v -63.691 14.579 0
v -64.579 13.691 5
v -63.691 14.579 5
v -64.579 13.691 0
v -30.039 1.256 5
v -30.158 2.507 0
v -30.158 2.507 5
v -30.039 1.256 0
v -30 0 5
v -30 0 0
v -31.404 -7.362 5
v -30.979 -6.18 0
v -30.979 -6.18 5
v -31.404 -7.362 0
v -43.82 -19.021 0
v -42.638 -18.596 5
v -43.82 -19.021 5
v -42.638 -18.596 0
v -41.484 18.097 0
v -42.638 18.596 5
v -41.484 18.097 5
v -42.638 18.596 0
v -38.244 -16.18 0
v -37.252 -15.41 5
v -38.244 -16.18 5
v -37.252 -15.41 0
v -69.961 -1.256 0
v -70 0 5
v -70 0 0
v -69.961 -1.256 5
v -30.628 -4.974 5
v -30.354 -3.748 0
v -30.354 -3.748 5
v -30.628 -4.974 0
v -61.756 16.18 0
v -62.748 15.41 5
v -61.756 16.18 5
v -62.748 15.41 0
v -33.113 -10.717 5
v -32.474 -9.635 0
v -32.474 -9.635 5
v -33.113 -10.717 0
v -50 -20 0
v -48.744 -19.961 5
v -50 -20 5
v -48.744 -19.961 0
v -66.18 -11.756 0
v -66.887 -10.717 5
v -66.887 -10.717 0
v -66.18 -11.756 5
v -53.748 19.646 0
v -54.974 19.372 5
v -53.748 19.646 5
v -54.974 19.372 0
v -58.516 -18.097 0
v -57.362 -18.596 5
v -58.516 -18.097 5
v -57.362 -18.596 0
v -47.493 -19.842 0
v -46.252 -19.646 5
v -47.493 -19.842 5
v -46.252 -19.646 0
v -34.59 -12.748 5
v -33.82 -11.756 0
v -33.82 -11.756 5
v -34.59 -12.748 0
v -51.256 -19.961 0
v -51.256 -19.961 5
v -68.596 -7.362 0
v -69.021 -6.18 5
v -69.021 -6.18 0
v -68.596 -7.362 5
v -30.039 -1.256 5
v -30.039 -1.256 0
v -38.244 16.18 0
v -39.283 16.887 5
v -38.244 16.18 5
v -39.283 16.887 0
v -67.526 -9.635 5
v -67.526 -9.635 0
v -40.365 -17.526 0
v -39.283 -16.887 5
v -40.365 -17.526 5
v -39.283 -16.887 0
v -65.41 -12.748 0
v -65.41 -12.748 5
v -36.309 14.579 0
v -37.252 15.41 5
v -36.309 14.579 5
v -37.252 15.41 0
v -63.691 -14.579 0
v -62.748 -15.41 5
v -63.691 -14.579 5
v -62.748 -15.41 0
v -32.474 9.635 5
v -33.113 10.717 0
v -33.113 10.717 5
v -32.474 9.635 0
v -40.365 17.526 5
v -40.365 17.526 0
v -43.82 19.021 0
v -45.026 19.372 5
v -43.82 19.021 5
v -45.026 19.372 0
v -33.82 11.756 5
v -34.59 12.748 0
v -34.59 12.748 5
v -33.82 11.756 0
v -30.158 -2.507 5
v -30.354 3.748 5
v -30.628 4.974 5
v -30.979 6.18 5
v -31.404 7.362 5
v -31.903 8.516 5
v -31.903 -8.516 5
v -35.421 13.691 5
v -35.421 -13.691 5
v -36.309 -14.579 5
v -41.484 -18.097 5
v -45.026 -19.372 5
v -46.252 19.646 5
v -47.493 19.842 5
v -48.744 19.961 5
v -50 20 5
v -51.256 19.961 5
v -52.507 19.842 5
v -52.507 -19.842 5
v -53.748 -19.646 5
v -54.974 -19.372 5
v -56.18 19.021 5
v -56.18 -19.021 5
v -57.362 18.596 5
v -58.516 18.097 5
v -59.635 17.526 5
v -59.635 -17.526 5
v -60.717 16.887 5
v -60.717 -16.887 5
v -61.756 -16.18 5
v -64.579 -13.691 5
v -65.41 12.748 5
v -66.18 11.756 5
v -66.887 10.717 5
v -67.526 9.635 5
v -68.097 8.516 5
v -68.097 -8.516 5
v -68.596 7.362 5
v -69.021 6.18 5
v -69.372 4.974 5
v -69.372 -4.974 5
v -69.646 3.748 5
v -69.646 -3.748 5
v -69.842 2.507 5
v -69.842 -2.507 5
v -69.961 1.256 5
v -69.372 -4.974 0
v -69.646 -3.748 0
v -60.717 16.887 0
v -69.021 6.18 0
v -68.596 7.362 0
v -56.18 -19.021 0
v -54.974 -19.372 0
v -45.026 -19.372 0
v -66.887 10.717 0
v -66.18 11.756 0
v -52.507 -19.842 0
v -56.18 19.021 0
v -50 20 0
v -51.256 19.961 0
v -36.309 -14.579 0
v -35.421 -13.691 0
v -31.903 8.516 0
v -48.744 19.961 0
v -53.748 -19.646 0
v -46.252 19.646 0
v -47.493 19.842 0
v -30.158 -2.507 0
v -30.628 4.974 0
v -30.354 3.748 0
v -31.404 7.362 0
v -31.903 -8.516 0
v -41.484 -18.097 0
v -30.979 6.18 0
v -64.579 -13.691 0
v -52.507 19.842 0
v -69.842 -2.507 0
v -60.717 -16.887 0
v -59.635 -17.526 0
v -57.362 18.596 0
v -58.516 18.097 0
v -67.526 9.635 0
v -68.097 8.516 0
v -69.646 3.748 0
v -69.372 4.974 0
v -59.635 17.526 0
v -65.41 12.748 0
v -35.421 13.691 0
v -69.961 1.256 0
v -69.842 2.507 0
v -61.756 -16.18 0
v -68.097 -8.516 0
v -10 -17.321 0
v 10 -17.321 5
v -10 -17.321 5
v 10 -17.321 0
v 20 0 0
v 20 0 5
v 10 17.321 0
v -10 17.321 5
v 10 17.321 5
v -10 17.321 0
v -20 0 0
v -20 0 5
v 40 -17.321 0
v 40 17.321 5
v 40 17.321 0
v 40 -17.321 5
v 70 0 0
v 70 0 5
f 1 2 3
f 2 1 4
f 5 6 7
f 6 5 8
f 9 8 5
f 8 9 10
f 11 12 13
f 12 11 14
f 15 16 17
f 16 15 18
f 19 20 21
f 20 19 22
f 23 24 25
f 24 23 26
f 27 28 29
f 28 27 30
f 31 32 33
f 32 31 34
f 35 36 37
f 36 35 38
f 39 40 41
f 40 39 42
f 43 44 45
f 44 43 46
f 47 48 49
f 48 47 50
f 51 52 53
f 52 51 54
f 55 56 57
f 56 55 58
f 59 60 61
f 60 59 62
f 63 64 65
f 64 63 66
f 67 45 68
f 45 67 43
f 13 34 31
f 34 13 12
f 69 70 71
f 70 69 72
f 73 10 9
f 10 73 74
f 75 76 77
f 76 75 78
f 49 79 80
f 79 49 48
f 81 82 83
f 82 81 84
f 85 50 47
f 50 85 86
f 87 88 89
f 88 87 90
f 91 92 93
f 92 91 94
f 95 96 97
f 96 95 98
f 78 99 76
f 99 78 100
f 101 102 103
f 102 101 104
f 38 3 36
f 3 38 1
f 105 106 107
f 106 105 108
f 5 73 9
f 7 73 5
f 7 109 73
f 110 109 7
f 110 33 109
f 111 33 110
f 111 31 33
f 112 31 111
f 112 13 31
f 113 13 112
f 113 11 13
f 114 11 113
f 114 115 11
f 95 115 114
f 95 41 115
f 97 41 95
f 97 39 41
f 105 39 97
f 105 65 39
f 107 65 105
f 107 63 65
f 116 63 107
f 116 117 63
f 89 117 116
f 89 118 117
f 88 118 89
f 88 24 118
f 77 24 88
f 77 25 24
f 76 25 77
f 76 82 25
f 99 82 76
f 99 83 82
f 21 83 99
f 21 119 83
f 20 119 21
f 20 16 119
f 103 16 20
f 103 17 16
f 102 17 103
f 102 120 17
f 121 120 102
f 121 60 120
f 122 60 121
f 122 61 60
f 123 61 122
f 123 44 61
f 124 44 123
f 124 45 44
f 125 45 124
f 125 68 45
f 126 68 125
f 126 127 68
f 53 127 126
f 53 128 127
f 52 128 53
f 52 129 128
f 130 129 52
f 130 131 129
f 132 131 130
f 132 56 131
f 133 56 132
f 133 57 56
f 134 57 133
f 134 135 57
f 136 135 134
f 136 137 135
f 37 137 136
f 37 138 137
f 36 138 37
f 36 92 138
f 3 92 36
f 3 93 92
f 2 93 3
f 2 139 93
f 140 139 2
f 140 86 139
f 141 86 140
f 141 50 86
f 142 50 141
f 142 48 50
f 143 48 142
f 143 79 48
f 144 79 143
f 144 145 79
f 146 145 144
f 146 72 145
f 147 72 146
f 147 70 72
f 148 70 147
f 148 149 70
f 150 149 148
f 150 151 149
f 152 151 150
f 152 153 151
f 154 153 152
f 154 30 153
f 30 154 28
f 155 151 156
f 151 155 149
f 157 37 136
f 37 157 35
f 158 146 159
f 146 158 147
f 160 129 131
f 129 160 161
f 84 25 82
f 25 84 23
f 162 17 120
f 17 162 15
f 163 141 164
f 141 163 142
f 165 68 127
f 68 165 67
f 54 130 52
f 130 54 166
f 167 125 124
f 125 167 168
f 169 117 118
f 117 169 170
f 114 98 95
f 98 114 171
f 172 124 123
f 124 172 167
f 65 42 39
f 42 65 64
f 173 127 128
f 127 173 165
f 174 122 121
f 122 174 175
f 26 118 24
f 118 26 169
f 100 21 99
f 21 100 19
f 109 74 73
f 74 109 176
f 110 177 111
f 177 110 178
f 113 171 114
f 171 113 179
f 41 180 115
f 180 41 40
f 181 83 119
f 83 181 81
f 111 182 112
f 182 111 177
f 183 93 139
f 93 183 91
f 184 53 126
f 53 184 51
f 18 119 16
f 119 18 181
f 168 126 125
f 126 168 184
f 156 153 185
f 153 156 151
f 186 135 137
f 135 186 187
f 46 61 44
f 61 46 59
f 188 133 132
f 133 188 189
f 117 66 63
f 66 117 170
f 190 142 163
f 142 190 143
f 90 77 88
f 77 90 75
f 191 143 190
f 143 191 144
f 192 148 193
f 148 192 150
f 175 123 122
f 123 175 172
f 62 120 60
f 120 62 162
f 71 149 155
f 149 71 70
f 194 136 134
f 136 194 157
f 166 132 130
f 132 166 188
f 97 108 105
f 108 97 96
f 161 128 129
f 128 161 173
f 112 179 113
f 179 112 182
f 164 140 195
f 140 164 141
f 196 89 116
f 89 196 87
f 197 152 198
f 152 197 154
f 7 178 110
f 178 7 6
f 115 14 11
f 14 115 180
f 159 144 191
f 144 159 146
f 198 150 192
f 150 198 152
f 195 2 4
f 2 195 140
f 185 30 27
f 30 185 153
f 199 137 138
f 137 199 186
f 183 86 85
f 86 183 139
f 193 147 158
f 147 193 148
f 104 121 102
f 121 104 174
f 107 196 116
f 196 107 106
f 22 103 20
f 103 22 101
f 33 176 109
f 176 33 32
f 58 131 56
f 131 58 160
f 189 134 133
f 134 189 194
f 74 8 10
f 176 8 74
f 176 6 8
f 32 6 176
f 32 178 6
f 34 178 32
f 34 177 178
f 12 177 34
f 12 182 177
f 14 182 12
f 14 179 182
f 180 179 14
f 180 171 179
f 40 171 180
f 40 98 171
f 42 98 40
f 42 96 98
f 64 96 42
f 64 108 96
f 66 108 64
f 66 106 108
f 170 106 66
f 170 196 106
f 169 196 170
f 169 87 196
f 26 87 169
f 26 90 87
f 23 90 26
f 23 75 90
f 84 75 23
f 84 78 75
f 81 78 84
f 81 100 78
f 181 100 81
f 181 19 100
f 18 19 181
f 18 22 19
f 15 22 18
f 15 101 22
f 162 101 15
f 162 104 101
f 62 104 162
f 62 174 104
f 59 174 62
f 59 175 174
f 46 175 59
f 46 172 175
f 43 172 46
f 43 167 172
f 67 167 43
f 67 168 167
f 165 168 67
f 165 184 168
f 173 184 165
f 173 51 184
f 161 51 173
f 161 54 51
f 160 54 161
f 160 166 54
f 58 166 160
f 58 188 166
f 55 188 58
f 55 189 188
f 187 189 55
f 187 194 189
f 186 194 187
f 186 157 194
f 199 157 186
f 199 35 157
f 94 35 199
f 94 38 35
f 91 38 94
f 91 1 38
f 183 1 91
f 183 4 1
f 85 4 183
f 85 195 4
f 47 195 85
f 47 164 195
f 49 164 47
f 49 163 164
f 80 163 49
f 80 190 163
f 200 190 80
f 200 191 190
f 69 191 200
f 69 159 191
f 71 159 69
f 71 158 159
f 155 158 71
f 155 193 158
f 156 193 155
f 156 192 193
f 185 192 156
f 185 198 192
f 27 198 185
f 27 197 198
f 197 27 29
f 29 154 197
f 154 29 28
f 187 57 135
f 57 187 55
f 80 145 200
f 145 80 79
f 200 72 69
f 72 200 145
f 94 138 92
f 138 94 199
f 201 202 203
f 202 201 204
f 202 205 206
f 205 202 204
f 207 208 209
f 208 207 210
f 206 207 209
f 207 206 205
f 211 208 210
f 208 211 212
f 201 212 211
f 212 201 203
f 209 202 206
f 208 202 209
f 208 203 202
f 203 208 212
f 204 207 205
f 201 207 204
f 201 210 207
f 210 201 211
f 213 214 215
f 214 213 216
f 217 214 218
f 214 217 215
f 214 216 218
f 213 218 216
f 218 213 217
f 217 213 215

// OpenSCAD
//----------------------------------------------------------
//-- Tutorial OpenScad
//-- Juan Gonzalez-Gomez (Obijuan) juan@iearobotics.com
//----------------------------------------------------------
//-- (c) Mayo, 2012
//-- Licencia GPL
//----------------------------------------------------------
//-- Ejemplo de figuras hechas con "cilindros"
//----------------------------------------------------------

//-- Moneda
translate([-50,0,0])
  cylinder(r=40/2, h=5, $fn=100);

//-- Hexágono
cylinder(r=40/2, h=5, $fn=6);

//-- Triángulo equilátero
translate([50,0,0])
  cylinder(r=40/2, h=5, $fn=3);
